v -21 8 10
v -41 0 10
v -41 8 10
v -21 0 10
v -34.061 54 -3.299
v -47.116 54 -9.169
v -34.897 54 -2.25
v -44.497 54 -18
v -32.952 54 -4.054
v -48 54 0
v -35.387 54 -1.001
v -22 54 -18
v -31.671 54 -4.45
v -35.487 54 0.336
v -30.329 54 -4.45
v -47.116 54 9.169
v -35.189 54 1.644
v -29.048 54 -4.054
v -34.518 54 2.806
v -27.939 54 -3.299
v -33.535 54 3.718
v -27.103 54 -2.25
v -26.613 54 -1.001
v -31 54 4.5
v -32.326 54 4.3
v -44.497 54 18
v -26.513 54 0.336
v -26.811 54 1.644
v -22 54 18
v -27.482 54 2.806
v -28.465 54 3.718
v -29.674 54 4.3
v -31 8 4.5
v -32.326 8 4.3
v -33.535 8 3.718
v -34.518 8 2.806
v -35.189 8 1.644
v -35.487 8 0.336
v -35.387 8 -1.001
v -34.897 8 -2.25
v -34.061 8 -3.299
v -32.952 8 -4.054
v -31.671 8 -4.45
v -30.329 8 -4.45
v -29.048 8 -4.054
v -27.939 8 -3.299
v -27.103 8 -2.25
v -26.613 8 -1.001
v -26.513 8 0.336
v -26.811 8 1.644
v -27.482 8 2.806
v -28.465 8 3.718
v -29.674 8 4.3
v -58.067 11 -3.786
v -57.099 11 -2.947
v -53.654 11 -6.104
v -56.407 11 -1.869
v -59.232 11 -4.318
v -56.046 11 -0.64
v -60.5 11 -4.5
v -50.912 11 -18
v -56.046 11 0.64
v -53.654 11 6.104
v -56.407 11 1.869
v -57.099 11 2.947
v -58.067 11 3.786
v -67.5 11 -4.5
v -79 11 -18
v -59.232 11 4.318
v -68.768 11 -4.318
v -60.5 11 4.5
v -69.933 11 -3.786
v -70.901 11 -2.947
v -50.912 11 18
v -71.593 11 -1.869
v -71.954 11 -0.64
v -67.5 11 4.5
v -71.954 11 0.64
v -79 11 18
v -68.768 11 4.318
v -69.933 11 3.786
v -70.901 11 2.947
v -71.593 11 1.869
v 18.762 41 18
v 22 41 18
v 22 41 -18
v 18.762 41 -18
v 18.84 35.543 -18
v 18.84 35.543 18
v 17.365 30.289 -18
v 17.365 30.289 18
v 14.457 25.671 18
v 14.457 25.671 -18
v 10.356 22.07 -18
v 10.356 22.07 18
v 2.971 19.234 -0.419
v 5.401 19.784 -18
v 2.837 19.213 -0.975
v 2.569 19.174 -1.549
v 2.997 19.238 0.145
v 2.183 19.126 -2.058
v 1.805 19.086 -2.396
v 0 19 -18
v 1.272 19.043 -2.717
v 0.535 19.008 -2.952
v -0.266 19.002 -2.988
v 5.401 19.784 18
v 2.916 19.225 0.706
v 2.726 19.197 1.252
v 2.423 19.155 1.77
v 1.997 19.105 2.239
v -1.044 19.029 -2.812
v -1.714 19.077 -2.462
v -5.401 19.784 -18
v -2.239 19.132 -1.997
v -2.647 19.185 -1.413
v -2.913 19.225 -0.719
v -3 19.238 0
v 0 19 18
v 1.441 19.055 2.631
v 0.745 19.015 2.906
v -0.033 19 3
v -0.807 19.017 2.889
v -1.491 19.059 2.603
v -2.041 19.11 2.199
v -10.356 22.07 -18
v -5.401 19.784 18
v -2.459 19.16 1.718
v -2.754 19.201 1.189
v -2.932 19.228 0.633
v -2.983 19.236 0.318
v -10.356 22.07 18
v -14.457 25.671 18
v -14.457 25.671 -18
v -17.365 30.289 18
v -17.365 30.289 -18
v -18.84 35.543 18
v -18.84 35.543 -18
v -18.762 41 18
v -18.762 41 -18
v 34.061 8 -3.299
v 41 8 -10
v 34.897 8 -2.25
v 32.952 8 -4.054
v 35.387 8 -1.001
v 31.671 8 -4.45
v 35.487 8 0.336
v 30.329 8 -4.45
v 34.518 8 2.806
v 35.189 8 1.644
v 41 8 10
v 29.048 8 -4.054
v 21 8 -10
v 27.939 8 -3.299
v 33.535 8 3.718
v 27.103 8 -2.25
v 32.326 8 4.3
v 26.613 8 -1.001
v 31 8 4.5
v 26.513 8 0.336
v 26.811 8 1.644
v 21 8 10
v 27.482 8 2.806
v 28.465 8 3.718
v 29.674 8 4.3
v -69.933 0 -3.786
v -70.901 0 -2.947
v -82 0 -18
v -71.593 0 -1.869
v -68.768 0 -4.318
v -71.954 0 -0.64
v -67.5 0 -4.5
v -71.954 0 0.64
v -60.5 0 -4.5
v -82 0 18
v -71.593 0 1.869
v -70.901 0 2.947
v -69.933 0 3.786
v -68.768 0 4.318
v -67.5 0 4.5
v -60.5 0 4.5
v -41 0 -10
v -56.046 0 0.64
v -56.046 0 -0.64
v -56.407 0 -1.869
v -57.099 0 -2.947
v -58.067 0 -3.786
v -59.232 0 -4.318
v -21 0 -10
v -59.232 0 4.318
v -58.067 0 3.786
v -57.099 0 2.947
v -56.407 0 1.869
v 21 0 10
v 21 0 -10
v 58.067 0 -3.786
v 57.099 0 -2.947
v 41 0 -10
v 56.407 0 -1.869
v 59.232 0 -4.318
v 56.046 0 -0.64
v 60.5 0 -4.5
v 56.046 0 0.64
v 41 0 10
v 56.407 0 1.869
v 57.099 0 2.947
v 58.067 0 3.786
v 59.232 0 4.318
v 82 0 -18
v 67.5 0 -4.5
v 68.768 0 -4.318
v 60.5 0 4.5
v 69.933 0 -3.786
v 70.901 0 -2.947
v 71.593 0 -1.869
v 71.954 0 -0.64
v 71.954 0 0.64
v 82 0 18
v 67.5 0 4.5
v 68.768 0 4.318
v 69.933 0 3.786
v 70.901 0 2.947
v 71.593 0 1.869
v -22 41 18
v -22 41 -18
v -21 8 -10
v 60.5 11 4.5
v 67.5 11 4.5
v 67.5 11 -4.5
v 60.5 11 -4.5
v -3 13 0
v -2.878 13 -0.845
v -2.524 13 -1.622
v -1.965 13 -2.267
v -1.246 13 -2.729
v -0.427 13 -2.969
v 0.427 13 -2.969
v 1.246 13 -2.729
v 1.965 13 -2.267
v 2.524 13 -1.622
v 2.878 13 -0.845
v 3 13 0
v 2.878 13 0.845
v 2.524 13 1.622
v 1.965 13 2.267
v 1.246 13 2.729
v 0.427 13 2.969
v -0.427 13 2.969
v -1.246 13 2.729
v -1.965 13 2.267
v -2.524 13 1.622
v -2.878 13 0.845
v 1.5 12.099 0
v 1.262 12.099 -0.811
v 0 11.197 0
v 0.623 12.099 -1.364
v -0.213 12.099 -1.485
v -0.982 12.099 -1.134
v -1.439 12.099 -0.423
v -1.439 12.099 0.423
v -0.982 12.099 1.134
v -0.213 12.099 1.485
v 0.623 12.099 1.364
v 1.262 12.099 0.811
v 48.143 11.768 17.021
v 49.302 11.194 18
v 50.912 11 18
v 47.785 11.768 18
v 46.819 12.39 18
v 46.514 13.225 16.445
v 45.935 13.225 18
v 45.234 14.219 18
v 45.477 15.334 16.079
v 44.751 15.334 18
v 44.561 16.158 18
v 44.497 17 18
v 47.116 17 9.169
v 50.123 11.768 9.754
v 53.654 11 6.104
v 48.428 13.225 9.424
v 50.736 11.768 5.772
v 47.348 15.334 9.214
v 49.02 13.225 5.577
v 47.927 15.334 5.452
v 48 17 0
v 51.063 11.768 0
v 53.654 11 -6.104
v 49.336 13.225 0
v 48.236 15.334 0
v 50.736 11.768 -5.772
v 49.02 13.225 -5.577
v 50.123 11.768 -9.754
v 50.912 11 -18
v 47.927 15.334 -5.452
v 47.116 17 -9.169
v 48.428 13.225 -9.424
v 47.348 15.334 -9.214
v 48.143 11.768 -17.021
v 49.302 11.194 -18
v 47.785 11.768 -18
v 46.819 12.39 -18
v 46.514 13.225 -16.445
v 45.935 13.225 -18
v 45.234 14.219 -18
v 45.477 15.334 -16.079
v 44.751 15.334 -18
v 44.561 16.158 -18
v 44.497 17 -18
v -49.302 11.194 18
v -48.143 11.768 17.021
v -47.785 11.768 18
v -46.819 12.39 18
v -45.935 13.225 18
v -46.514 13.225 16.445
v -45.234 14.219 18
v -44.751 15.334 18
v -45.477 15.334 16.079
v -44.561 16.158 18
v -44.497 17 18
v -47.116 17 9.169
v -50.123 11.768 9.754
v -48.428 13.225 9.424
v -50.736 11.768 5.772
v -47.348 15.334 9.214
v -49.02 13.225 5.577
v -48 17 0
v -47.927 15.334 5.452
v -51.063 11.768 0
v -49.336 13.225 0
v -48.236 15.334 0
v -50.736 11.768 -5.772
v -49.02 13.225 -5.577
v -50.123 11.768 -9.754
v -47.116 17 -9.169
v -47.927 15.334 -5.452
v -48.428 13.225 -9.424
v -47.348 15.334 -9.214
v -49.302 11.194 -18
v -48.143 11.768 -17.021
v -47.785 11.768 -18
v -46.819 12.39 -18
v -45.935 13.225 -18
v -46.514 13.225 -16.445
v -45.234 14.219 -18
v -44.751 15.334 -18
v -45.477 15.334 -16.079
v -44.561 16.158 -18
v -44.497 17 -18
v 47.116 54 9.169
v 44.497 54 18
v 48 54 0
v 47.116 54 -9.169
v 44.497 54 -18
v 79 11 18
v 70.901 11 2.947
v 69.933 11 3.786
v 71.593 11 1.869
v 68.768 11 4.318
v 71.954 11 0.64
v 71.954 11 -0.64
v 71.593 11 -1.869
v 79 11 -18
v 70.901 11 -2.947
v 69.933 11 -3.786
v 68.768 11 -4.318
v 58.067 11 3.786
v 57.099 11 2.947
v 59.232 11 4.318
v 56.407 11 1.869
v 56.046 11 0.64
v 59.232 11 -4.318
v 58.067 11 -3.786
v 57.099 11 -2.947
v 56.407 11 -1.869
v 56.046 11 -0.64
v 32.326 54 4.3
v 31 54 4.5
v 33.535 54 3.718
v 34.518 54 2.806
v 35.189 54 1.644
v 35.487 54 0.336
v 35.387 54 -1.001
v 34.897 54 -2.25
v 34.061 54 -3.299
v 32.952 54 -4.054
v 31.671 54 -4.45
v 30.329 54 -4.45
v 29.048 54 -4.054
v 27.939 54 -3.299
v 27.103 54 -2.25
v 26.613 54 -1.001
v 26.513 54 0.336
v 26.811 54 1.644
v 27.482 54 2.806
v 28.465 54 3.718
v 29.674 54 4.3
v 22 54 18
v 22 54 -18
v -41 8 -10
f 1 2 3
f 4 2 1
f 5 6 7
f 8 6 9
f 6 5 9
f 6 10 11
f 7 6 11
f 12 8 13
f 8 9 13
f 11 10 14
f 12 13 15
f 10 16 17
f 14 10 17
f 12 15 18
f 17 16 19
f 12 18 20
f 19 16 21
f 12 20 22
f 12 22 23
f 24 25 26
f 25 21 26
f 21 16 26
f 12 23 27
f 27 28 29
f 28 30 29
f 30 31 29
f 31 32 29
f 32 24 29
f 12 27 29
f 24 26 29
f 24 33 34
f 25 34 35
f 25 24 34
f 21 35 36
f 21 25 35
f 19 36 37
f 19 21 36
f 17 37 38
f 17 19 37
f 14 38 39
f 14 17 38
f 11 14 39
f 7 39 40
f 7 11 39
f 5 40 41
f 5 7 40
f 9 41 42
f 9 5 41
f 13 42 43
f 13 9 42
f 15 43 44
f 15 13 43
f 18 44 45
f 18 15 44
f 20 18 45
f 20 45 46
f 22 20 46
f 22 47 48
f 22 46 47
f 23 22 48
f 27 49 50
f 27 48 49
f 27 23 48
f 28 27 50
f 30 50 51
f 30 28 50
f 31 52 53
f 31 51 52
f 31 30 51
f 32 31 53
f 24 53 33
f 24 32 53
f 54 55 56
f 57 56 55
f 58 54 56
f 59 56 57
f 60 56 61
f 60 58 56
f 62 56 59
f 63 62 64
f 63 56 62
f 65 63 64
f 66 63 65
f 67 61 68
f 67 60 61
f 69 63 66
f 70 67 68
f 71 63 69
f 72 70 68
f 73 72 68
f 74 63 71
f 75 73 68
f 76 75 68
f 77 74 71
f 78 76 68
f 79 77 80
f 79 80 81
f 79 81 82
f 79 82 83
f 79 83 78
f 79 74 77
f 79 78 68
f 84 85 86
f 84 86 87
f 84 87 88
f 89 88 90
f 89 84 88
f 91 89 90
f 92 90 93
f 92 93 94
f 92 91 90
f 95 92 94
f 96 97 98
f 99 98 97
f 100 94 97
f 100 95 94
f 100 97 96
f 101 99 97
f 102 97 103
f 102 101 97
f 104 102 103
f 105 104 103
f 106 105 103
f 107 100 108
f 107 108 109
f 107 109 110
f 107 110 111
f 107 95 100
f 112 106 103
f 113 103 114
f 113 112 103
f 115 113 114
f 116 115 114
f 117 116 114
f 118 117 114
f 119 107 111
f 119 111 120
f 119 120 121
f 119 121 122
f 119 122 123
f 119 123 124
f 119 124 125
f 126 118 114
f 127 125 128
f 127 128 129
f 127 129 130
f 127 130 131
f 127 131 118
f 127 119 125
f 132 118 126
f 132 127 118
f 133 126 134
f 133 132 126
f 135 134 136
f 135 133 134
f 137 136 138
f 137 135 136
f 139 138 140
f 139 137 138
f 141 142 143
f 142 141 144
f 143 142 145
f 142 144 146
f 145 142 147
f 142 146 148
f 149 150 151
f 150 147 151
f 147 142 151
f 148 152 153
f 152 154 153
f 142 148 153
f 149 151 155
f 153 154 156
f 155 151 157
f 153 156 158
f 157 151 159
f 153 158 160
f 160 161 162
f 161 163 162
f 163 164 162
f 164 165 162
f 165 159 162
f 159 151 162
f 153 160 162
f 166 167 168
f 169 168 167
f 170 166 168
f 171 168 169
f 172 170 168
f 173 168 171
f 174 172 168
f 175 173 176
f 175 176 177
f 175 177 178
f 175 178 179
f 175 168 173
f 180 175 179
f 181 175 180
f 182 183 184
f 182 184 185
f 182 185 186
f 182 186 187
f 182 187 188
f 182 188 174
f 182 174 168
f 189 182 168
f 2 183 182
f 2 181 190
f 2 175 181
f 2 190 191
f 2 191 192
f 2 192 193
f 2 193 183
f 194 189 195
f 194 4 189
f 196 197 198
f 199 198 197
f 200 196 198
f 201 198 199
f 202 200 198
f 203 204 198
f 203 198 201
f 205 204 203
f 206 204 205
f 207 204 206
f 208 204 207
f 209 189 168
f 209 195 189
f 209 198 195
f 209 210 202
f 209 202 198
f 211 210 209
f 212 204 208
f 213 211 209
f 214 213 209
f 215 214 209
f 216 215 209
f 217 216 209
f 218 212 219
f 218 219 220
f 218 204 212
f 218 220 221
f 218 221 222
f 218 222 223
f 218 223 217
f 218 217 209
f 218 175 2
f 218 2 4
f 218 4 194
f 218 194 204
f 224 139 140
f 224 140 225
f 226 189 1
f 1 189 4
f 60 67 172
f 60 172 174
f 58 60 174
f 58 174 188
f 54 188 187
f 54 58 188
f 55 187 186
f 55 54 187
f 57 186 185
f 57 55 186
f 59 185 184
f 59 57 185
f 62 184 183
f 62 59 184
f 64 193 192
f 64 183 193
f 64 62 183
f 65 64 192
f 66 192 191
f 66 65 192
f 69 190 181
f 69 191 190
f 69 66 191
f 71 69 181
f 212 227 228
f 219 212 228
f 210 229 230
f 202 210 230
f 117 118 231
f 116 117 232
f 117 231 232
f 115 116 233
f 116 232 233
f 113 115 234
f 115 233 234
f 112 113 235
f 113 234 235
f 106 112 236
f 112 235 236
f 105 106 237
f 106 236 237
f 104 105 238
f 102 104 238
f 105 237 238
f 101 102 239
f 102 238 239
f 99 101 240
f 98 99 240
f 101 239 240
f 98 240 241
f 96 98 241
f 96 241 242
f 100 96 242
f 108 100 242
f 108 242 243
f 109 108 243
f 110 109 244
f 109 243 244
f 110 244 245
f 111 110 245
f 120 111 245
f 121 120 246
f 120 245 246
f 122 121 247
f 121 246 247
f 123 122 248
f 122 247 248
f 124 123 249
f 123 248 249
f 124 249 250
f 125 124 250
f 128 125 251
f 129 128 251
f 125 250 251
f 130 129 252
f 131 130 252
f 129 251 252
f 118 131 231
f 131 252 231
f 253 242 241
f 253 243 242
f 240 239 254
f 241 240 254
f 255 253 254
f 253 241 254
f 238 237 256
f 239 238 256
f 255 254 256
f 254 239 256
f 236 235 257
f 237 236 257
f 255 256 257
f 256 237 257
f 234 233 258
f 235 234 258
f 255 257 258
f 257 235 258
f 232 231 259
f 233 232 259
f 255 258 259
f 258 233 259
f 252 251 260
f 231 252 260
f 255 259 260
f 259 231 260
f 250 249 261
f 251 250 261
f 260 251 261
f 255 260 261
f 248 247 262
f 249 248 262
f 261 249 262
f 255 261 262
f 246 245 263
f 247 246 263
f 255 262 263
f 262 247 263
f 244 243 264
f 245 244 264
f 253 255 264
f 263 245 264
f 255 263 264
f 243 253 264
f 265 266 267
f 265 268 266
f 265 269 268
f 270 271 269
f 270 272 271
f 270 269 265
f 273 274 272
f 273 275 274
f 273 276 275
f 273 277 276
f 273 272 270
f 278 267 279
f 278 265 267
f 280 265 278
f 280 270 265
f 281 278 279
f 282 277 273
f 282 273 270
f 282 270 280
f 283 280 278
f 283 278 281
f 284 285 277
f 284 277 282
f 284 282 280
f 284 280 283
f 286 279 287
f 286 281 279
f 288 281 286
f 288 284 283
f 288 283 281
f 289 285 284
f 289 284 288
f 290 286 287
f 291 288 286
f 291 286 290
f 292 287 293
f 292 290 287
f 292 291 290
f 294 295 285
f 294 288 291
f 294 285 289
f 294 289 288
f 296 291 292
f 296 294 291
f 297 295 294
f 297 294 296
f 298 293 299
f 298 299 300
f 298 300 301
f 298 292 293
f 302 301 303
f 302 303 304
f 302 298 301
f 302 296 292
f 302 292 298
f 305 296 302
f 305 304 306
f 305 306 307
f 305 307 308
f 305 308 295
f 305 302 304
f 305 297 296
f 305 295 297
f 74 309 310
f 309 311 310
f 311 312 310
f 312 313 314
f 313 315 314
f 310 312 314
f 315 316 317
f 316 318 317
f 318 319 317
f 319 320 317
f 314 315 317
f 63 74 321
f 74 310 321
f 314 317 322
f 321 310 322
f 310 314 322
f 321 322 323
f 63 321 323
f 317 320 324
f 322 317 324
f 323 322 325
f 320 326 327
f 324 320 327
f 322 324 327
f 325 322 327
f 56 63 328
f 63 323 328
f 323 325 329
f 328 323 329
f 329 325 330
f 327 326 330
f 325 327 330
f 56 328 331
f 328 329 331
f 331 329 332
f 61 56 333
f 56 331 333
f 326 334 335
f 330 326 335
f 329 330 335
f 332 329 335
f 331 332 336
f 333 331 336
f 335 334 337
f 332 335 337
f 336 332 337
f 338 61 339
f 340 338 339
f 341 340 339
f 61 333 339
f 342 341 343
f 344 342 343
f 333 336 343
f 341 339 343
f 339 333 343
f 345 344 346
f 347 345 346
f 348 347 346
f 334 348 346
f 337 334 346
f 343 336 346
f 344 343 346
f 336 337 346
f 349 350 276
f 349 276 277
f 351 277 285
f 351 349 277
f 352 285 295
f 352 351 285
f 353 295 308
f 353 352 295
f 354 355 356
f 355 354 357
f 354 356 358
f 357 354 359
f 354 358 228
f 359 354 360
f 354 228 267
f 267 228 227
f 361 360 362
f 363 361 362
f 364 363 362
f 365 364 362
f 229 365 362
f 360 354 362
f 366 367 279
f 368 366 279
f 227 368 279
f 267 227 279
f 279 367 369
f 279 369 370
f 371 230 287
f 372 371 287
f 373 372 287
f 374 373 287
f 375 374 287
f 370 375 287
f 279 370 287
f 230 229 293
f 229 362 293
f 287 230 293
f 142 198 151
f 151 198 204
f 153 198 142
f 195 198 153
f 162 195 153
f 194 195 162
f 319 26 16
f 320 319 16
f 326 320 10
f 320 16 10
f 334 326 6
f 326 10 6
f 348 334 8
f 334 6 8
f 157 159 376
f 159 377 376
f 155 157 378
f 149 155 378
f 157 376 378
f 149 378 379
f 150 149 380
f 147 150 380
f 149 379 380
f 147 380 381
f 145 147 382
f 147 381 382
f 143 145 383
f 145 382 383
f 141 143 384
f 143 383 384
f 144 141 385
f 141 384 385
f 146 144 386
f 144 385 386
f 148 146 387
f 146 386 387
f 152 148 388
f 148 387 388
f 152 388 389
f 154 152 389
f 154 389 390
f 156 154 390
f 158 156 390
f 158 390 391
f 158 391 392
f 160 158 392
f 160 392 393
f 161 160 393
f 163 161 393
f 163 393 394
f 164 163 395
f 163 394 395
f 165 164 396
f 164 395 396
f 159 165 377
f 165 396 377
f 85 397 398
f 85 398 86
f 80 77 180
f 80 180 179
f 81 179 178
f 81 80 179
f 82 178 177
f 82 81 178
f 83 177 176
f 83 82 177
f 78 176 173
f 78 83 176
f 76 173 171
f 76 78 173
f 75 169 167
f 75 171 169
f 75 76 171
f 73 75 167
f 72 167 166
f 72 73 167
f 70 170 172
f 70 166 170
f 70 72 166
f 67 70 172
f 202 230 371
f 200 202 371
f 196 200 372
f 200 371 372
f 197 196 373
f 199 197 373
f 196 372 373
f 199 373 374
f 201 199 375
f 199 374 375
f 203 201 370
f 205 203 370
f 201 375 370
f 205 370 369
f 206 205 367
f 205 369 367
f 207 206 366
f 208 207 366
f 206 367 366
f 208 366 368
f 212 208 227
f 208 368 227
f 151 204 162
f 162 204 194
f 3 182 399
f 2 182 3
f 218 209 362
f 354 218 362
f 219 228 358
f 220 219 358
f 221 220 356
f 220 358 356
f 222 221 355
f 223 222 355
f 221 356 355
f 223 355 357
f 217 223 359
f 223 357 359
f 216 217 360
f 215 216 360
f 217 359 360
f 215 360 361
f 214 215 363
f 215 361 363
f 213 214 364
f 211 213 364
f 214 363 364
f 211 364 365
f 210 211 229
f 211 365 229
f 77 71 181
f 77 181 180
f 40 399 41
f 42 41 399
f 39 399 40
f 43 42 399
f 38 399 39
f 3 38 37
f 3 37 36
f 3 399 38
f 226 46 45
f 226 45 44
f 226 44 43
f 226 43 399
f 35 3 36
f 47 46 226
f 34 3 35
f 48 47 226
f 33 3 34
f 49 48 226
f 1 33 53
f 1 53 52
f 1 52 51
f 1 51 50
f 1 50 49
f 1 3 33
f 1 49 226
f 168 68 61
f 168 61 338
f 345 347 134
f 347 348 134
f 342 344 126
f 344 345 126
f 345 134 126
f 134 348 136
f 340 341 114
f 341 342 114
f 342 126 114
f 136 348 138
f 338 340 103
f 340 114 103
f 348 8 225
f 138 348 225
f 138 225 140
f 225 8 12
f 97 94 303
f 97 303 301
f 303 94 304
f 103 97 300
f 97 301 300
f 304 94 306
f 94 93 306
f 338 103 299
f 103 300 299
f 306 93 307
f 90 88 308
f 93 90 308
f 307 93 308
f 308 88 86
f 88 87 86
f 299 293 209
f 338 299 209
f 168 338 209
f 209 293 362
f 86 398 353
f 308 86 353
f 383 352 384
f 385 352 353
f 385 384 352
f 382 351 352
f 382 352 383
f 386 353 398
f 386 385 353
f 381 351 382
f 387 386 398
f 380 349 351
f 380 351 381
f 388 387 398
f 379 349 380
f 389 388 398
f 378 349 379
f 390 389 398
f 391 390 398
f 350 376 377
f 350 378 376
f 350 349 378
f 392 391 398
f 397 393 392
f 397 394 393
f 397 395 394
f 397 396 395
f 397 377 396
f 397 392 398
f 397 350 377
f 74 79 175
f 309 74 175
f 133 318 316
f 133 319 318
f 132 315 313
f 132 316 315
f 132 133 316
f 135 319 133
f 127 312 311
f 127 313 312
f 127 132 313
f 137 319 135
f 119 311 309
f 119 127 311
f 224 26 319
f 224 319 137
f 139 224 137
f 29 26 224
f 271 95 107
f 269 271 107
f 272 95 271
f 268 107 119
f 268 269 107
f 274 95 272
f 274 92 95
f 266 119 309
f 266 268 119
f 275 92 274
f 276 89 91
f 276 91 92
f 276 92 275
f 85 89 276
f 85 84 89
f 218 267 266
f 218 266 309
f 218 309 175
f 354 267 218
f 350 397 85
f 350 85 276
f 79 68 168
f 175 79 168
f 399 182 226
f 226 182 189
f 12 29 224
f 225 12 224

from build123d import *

# Parameters (mm, degrees)
BOSS_EXTRUDE1_DEPTH                 = 18
SKETCH2_W                           = 28
SKETCH2_H                           = 36
CUT_EXTRUDE1_DEPTH                  = 43
CUT_EXTRUDE2_DEPTH                  = 43
SKETCH4_W                           = 20
SKETCH4_H                           = 20
CUT_EXTRUDE3_DEPTH                  = 8
FILLET1_R                           = 6
CUT_EXTRUDE4_DEPTH                  = 12.0000001
F_6_0MM_DOWEL_HOLE3_D               = 6
F_6_0MM_DOWEL_HOLE3_DEPTH           = 6
F_6_0MM_DOWEL_HOLE3_TIP             = 1.802581857
F_6_0MM_DOWEL_HOLE3_ON_FACE_2_D     = 6
F_6_0MM_DOWEL_HOLE3_ON_FACE_2_DEPTH = 6
F_6_0MM_DOWEL_HOLE3_ON_FACE_2_TIP   = 1.802581857


with BuildPart() as part:
    # Sketch1 → Boss-Extrude1 (new body, symmetric)
    with BuildSketch(Plane.XY):
        with BuildLine():
            Line((-82, 0), (82, 0))
            Line((82, 0), (79, 11))
            Line((79, 11), (50, 11))
            Line((50, 11), (50, 54))
            Line((50, 54), (22, 54))
            Line((22, 54), (22, 41))
            Line((22, 41), (18.761663039, 41))
            ThreePointArc((18.761663039, 41), (0, 19), (-18.761663039, 41))
            Line((-18.761663039, 41), (-22, 41))
            Line((-22, 41), (-22, 54))
            Line((-22, 54), (-50, 54))
            Line((-50, 54), (-50, 11))
            Line((-50, 11), (-79, 11))
            Line((-79, 11), (-82, 0))
        make_face()
    boss_extrude1 = extrude(amount=BOSS_EXTRUDE1_DEPTH, both=True)

    # Sketch2 → Cut-Extrude1 (cut)
    with BuildSketch(Plane(origin=(0, 54, 0), x_dir=(1, 0, 0), z_dir=(0, 1, 0))):
        with Locations((-36, 0)):
            Rectangle(SKETCH2_W, SKETCH2_H)
    extrude(amount=-CUT_EXTRUDE1_DEPTH, mode=Mode.SUBTRACT)

    # Mirror1: Boss-Extrude1 across plane
    add(boss_extrude1.mirror(Plane(origin=(0, 0, 0), x_dir=(0, 0, 1), z_dir=(1, 0, 0))))

    # Sketch3 → Cut-Extrude2 (cut)
    with BuildSketch(Plane(origin=(0, 54, 0), x_dir=(1, 0, 0), z_dir=(0, 1, 0))):
        with BuildLine():
            Line((44.497190923, 18), (50, 18))
            Line((50, 18), (50, -18))
            Line((50, -18), (44.497190923, -18))
            ThreePointArc((44.497190923, -18), (48, 0), (44.497190923, 18))
        make_face()
    cut_extrude2 = extrude(amount=-CUT_EXTRUDE2_DEPTH, mode=Mode.SUBTRACT)

    # Mirror2: Cut-Extrude2 across plane
    add(cut_extrude2.mirror(Plane(origin=(0, 0, 0), x_dir=(0, 0, 1), z_dir=(1, 0, 0))), mode=Mode.SUBTRACT)

    # Sketch4 → Cut-Extrude3 (cut)
    with BuildSketch(Plane.XZ):
        with Locations((-31, 0)):
            Rectangle(SKETCH4_W, SKETCH4_H)
    cut_extrude3 = extrude(amount=-CUT_EXTRUDE3_DEPTH, mode=Mode.SUBTRACT)

    # Mirror3: Cut-Extrude3 across plane
    add(cut_extrude3.mirror(Plane(origin=(0, 0, 0), x_dir=(0, 0, 1), z_dir=(1, 0, 0))), mode=Mode.SUBTRACT)

    # Fillet1
    fillet1_edges = [part.edges().sort_by_distance(p)[0] for p in [
        (-48, 11, 0),
        (48, 11, 0),
    ]]
    fillet(fillet1_edges, radius=FILLET1_R)

    # Sketch10 → Ø6.0mm Dowel Hole2 (revolve, cut)
    with BuildSketch(Plane(origin=(-31, 54, 0), x_dir=(0, 0, 1), z_dir=(1, 0, 0))):
        Polygon((0, 0), (0, 56.703872786), (4.5, 54), (4.5, 0), align=None)
    f_6_0mm_dowel_hole2 = revolve(axis=Axis((-31, 60.35, 0), (0, -1, 0)), mode=Mode.SUBTRACT)

    # Mirror4: Ø6.0mm Dowel Hole2 across plane
    add(f_6_0mm_dowel_hole2.mirror(Plane(origin=(0, 0, 0), x_dir=(0, 0, 1), z_dir=(1, 0, 0))), mode=Mode.SUBTRACT)

    # Sketch18 → Cut-Extrude4 (cut, through all)
    with BuildSketch(Plane(origin=(0, 11, 0), x_dir=(1, 0, 0), z_dir=(0, 1, 0))):
        with BuildLine():
            Line((-67.5, 4.5), (-60.5, 4.5))
            ThreePointArc((-60.5, 4.5), (-56, 0), (-60.5, -4.5))
            Line((-60.5, -4.5), (-67.5, -4.5))
            ThreePointArc((-67.5, -4.5), (-72, 0), (-67.5, 4.5))
        make_face()
    cut_extrude4 = extrude(amount=-CUT_EXTRUDE4_DEPTH, mode=Mode.SUBTRACT)

    # Mirror5: Cut-Extrude4 across plane
    add(cut_extrude4.mirror(Plane(origin=(0, 0, 0), x_dir=(0, 0, 1), z_dir=(1, 0, 0))), mode=Mode.SUBTRACT)

    # Ø6.0mm Dowel Hole3
    with Locations(Plane(origin=(0, 19, 0), x_dir=(1, 0, 0), z_dir=(0, 1, 0))):
        with Locations((0, 0)):
            Hole(F_6_0MM_DOWEL_HOLE3_D / 2, depth=F_6_0MM_DOWEL_HOLE3_DEPTH)
            with Locations((0, 0, -(F_6_0MM_DOWEL_HOLE3_DEPTH + F_6_0MM_DOWEL_HOLE3_TIP / 2))):  # 118° drill point
                Cone(0, F_6_0MM_DOWEL_HOLE3_D / 2, F_6_0MM_DOWEL_HOLE3_TIP, mode=Mode.SUBTRACT)

    # Ø6.0mm Dowel Hole3 on face 2
    with Locations(Plane(origin=(-148.466540519, 0, -78.953744881), x_dir=(1, 0, 0), z_dir=(0, 1, 0))):
        with Locations((0, 0)):
            Hole(F_6_0MM_DOWEL_HOLE3_ON_FACE_2_D / 2, depth=F_6_0MM_DOWEL_HOLE3_ON_FACE_2_DEPTH)
            with Locations((0, 0, -(F_6_0MM_DOWEL_HOLE3_ON_FACE_2_DEPTH + F_6_0MM_DOWEL_HOLE3_ON_FACE_2_TIP / 2))):  # 118° drill point
                Cone(0, F_6_0MM_DOWEL_HOLE3_ON_FACE_2_D / 2, F_6_0MM_DOWEL_HOLE3_ON_FACE_2_TIP, mode=Mode.SUBTRACT)


solid = part.part
